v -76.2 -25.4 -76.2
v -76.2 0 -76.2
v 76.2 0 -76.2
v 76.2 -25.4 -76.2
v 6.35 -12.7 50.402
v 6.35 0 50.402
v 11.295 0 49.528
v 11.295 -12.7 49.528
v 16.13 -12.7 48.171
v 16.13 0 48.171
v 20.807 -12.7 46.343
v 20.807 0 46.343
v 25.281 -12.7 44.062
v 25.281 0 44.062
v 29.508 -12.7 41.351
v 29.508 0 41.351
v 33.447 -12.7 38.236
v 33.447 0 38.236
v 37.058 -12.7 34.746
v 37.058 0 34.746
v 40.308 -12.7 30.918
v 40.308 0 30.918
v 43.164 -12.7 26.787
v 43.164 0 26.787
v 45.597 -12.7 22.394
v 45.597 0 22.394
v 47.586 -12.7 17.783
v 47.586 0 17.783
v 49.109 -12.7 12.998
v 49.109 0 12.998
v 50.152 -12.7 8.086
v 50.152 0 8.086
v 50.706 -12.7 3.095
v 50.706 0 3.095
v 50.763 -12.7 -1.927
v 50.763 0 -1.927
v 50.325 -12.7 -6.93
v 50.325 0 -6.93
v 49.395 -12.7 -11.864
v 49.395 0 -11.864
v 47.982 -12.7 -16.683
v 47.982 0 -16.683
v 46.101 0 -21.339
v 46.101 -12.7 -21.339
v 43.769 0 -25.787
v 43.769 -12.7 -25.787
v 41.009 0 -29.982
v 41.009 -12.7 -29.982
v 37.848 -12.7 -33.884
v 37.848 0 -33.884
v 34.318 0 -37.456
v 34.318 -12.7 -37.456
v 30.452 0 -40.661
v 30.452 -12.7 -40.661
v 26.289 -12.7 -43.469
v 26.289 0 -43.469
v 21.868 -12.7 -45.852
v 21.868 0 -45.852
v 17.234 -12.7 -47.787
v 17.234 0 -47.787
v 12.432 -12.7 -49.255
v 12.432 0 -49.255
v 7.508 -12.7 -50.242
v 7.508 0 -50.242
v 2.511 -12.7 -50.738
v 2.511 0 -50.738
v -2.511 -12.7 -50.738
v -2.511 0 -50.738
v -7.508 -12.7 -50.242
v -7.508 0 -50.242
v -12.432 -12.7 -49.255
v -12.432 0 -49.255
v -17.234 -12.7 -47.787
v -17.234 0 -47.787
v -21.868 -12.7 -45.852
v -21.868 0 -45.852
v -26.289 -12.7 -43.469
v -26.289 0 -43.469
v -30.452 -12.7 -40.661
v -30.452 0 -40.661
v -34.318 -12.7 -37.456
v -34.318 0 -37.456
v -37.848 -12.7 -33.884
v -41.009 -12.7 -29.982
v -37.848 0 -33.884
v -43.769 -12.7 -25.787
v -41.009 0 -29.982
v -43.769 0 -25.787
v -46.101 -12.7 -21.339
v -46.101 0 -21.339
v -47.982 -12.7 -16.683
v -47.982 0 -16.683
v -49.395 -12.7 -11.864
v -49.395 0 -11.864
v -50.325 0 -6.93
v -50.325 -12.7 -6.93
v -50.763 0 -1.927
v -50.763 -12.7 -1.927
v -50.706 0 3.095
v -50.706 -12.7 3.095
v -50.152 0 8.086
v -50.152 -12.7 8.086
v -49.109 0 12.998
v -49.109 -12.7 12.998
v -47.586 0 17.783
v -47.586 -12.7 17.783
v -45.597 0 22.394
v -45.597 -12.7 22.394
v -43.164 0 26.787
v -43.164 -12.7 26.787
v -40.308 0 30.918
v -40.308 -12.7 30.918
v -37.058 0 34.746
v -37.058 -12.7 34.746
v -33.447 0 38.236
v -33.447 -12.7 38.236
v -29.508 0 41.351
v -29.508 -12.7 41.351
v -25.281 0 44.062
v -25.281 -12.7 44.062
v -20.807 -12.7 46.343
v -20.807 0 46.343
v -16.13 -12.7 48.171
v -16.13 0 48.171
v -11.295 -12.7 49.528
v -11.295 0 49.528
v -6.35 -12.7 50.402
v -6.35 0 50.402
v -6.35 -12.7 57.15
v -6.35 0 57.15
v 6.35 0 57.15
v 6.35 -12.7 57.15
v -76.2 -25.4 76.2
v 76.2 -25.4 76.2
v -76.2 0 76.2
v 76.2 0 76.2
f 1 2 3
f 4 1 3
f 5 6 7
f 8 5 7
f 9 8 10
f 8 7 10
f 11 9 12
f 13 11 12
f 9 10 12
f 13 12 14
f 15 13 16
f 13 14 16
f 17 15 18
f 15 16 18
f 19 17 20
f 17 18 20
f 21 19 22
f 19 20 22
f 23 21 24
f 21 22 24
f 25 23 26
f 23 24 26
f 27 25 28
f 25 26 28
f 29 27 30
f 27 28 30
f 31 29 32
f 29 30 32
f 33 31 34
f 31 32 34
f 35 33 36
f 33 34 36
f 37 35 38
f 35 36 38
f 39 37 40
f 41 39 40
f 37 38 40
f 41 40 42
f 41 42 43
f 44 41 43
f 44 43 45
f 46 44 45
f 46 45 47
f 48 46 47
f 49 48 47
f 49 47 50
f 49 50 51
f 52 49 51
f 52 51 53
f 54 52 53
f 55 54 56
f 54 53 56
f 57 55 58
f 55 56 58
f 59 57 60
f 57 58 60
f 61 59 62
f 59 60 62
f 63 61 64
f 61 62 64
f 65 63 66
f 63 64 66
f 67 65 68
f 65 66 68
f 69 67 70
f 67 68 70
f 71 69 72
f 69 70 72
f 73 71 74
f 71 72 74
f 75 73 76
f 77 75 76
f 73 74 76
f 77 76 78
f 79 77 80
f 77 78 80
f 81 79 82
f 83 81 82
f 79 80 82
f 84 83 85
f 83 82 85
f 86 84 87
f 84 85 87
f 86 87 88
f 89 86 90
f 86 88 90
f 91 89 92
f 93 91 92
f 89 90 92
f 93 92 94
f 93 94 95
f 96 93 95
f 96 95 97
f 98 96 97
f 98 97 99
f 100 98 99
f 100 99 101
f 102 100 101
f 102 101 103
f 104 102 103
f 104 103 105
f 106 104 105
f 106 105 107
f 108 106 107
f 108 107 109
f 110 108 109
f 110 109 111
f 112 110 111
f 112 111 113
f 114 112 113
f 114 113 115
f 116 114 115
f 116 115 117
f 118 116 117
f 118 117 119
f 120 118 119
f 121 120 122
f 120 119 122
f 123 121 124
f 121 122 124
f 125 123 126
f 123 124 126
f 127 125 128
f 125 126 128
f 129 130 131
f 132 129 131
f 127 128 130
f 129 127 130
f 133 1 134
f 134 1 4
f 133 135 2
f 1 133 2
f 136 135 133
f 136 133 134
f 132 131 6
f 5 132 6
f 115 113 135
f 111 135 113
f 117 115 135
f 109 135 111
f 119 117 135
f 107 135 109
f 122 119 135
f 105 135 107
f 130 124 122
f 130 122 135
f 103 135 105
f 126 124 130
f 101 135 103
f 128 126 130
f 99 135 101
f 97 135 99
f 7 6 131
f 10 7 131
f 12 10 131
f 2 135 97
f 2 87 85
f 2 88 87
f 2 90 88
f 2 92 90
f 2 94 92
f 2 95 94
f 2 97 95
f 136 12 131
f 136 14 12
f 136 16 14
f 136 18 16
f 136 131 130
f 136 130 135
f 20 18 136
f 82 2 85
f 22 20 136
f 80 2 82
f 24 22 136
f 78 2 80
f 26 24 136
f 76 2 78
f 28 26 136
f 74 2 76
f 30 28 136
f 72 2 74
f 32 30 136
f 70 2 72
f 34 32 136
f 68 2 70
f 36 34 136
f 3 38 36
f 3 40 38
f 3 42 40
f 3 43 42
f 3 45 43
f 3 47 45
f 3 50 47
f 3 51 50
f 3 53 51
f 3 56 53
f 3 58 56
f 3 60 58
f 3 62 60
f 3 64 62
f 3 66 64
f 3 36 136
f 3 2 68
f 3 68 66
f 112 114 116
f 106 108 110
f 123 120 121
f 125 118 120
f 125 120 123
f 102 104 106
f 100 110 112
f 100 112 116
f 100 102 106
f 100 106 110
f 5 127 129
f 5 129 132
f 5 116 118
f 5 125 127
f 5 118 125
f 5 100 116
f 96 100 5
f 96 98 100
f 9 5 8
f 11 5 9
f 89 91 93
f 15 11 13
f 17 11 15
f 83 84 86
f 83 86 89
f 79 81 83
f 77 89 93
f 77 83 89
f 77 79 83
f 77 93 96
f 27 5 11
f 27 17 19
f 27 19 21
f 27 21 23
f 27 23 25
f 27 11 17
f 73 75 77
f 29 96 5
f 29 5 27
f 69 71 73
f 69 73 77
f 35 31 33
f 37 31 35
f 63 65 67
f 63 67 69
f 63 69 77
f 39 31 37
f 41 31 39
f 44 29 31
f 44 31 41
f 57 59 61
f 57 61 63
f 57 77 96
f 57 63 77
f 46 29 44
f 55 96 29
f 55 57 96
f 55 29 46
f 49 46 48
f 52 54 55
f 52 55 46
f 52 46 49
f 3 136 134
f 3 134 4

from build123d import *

# Parameters (mm, degrees)
SKETCH1_W           = 152.4
SKETCH1_H           = 152.4
BOSS_EXTRUDE1_DEPTH = 25.4
CUT_EXTRUDE1_DEPTH  = 12.7


with BuildPart() as part:
    # Sketch1 → Boss-Extrude1 (new body)
    with BuildSketch(Plane(origin=(0, 0, 0), x_dir=(1, 0, 0), z_dir=(0, 1, 0))):
        Rectangle(SKETCH1_W, SKETCH1_H)
    extrude(amount=-BOSS_EXTRUDE1_DEPTH)

    # Sketch2 → Cut-Extrude1 (cut)
    with BuildSketch(Plane(origin=(0, 0, 0), x_dir=(1, 0, 0), z_dir=(0, 1, 0))):
        with BuildLine():
            Line((-6.35, -50.401562476), (-6.35, -57.15))
            Line((-6.35, -57.15), (6.35, -57.15))
            Line((6.35, -57.15), (6.35, -50.401562476))
            ThreePointArc((6.35, -50.401562476), (0, 50.8), (-6.35, -50.401562476))
        make_face()
    extrude(amount=-CUT_EXTRUDE1_DEPTH, mode=Mode.SUBTRACT)


solid = part.part
